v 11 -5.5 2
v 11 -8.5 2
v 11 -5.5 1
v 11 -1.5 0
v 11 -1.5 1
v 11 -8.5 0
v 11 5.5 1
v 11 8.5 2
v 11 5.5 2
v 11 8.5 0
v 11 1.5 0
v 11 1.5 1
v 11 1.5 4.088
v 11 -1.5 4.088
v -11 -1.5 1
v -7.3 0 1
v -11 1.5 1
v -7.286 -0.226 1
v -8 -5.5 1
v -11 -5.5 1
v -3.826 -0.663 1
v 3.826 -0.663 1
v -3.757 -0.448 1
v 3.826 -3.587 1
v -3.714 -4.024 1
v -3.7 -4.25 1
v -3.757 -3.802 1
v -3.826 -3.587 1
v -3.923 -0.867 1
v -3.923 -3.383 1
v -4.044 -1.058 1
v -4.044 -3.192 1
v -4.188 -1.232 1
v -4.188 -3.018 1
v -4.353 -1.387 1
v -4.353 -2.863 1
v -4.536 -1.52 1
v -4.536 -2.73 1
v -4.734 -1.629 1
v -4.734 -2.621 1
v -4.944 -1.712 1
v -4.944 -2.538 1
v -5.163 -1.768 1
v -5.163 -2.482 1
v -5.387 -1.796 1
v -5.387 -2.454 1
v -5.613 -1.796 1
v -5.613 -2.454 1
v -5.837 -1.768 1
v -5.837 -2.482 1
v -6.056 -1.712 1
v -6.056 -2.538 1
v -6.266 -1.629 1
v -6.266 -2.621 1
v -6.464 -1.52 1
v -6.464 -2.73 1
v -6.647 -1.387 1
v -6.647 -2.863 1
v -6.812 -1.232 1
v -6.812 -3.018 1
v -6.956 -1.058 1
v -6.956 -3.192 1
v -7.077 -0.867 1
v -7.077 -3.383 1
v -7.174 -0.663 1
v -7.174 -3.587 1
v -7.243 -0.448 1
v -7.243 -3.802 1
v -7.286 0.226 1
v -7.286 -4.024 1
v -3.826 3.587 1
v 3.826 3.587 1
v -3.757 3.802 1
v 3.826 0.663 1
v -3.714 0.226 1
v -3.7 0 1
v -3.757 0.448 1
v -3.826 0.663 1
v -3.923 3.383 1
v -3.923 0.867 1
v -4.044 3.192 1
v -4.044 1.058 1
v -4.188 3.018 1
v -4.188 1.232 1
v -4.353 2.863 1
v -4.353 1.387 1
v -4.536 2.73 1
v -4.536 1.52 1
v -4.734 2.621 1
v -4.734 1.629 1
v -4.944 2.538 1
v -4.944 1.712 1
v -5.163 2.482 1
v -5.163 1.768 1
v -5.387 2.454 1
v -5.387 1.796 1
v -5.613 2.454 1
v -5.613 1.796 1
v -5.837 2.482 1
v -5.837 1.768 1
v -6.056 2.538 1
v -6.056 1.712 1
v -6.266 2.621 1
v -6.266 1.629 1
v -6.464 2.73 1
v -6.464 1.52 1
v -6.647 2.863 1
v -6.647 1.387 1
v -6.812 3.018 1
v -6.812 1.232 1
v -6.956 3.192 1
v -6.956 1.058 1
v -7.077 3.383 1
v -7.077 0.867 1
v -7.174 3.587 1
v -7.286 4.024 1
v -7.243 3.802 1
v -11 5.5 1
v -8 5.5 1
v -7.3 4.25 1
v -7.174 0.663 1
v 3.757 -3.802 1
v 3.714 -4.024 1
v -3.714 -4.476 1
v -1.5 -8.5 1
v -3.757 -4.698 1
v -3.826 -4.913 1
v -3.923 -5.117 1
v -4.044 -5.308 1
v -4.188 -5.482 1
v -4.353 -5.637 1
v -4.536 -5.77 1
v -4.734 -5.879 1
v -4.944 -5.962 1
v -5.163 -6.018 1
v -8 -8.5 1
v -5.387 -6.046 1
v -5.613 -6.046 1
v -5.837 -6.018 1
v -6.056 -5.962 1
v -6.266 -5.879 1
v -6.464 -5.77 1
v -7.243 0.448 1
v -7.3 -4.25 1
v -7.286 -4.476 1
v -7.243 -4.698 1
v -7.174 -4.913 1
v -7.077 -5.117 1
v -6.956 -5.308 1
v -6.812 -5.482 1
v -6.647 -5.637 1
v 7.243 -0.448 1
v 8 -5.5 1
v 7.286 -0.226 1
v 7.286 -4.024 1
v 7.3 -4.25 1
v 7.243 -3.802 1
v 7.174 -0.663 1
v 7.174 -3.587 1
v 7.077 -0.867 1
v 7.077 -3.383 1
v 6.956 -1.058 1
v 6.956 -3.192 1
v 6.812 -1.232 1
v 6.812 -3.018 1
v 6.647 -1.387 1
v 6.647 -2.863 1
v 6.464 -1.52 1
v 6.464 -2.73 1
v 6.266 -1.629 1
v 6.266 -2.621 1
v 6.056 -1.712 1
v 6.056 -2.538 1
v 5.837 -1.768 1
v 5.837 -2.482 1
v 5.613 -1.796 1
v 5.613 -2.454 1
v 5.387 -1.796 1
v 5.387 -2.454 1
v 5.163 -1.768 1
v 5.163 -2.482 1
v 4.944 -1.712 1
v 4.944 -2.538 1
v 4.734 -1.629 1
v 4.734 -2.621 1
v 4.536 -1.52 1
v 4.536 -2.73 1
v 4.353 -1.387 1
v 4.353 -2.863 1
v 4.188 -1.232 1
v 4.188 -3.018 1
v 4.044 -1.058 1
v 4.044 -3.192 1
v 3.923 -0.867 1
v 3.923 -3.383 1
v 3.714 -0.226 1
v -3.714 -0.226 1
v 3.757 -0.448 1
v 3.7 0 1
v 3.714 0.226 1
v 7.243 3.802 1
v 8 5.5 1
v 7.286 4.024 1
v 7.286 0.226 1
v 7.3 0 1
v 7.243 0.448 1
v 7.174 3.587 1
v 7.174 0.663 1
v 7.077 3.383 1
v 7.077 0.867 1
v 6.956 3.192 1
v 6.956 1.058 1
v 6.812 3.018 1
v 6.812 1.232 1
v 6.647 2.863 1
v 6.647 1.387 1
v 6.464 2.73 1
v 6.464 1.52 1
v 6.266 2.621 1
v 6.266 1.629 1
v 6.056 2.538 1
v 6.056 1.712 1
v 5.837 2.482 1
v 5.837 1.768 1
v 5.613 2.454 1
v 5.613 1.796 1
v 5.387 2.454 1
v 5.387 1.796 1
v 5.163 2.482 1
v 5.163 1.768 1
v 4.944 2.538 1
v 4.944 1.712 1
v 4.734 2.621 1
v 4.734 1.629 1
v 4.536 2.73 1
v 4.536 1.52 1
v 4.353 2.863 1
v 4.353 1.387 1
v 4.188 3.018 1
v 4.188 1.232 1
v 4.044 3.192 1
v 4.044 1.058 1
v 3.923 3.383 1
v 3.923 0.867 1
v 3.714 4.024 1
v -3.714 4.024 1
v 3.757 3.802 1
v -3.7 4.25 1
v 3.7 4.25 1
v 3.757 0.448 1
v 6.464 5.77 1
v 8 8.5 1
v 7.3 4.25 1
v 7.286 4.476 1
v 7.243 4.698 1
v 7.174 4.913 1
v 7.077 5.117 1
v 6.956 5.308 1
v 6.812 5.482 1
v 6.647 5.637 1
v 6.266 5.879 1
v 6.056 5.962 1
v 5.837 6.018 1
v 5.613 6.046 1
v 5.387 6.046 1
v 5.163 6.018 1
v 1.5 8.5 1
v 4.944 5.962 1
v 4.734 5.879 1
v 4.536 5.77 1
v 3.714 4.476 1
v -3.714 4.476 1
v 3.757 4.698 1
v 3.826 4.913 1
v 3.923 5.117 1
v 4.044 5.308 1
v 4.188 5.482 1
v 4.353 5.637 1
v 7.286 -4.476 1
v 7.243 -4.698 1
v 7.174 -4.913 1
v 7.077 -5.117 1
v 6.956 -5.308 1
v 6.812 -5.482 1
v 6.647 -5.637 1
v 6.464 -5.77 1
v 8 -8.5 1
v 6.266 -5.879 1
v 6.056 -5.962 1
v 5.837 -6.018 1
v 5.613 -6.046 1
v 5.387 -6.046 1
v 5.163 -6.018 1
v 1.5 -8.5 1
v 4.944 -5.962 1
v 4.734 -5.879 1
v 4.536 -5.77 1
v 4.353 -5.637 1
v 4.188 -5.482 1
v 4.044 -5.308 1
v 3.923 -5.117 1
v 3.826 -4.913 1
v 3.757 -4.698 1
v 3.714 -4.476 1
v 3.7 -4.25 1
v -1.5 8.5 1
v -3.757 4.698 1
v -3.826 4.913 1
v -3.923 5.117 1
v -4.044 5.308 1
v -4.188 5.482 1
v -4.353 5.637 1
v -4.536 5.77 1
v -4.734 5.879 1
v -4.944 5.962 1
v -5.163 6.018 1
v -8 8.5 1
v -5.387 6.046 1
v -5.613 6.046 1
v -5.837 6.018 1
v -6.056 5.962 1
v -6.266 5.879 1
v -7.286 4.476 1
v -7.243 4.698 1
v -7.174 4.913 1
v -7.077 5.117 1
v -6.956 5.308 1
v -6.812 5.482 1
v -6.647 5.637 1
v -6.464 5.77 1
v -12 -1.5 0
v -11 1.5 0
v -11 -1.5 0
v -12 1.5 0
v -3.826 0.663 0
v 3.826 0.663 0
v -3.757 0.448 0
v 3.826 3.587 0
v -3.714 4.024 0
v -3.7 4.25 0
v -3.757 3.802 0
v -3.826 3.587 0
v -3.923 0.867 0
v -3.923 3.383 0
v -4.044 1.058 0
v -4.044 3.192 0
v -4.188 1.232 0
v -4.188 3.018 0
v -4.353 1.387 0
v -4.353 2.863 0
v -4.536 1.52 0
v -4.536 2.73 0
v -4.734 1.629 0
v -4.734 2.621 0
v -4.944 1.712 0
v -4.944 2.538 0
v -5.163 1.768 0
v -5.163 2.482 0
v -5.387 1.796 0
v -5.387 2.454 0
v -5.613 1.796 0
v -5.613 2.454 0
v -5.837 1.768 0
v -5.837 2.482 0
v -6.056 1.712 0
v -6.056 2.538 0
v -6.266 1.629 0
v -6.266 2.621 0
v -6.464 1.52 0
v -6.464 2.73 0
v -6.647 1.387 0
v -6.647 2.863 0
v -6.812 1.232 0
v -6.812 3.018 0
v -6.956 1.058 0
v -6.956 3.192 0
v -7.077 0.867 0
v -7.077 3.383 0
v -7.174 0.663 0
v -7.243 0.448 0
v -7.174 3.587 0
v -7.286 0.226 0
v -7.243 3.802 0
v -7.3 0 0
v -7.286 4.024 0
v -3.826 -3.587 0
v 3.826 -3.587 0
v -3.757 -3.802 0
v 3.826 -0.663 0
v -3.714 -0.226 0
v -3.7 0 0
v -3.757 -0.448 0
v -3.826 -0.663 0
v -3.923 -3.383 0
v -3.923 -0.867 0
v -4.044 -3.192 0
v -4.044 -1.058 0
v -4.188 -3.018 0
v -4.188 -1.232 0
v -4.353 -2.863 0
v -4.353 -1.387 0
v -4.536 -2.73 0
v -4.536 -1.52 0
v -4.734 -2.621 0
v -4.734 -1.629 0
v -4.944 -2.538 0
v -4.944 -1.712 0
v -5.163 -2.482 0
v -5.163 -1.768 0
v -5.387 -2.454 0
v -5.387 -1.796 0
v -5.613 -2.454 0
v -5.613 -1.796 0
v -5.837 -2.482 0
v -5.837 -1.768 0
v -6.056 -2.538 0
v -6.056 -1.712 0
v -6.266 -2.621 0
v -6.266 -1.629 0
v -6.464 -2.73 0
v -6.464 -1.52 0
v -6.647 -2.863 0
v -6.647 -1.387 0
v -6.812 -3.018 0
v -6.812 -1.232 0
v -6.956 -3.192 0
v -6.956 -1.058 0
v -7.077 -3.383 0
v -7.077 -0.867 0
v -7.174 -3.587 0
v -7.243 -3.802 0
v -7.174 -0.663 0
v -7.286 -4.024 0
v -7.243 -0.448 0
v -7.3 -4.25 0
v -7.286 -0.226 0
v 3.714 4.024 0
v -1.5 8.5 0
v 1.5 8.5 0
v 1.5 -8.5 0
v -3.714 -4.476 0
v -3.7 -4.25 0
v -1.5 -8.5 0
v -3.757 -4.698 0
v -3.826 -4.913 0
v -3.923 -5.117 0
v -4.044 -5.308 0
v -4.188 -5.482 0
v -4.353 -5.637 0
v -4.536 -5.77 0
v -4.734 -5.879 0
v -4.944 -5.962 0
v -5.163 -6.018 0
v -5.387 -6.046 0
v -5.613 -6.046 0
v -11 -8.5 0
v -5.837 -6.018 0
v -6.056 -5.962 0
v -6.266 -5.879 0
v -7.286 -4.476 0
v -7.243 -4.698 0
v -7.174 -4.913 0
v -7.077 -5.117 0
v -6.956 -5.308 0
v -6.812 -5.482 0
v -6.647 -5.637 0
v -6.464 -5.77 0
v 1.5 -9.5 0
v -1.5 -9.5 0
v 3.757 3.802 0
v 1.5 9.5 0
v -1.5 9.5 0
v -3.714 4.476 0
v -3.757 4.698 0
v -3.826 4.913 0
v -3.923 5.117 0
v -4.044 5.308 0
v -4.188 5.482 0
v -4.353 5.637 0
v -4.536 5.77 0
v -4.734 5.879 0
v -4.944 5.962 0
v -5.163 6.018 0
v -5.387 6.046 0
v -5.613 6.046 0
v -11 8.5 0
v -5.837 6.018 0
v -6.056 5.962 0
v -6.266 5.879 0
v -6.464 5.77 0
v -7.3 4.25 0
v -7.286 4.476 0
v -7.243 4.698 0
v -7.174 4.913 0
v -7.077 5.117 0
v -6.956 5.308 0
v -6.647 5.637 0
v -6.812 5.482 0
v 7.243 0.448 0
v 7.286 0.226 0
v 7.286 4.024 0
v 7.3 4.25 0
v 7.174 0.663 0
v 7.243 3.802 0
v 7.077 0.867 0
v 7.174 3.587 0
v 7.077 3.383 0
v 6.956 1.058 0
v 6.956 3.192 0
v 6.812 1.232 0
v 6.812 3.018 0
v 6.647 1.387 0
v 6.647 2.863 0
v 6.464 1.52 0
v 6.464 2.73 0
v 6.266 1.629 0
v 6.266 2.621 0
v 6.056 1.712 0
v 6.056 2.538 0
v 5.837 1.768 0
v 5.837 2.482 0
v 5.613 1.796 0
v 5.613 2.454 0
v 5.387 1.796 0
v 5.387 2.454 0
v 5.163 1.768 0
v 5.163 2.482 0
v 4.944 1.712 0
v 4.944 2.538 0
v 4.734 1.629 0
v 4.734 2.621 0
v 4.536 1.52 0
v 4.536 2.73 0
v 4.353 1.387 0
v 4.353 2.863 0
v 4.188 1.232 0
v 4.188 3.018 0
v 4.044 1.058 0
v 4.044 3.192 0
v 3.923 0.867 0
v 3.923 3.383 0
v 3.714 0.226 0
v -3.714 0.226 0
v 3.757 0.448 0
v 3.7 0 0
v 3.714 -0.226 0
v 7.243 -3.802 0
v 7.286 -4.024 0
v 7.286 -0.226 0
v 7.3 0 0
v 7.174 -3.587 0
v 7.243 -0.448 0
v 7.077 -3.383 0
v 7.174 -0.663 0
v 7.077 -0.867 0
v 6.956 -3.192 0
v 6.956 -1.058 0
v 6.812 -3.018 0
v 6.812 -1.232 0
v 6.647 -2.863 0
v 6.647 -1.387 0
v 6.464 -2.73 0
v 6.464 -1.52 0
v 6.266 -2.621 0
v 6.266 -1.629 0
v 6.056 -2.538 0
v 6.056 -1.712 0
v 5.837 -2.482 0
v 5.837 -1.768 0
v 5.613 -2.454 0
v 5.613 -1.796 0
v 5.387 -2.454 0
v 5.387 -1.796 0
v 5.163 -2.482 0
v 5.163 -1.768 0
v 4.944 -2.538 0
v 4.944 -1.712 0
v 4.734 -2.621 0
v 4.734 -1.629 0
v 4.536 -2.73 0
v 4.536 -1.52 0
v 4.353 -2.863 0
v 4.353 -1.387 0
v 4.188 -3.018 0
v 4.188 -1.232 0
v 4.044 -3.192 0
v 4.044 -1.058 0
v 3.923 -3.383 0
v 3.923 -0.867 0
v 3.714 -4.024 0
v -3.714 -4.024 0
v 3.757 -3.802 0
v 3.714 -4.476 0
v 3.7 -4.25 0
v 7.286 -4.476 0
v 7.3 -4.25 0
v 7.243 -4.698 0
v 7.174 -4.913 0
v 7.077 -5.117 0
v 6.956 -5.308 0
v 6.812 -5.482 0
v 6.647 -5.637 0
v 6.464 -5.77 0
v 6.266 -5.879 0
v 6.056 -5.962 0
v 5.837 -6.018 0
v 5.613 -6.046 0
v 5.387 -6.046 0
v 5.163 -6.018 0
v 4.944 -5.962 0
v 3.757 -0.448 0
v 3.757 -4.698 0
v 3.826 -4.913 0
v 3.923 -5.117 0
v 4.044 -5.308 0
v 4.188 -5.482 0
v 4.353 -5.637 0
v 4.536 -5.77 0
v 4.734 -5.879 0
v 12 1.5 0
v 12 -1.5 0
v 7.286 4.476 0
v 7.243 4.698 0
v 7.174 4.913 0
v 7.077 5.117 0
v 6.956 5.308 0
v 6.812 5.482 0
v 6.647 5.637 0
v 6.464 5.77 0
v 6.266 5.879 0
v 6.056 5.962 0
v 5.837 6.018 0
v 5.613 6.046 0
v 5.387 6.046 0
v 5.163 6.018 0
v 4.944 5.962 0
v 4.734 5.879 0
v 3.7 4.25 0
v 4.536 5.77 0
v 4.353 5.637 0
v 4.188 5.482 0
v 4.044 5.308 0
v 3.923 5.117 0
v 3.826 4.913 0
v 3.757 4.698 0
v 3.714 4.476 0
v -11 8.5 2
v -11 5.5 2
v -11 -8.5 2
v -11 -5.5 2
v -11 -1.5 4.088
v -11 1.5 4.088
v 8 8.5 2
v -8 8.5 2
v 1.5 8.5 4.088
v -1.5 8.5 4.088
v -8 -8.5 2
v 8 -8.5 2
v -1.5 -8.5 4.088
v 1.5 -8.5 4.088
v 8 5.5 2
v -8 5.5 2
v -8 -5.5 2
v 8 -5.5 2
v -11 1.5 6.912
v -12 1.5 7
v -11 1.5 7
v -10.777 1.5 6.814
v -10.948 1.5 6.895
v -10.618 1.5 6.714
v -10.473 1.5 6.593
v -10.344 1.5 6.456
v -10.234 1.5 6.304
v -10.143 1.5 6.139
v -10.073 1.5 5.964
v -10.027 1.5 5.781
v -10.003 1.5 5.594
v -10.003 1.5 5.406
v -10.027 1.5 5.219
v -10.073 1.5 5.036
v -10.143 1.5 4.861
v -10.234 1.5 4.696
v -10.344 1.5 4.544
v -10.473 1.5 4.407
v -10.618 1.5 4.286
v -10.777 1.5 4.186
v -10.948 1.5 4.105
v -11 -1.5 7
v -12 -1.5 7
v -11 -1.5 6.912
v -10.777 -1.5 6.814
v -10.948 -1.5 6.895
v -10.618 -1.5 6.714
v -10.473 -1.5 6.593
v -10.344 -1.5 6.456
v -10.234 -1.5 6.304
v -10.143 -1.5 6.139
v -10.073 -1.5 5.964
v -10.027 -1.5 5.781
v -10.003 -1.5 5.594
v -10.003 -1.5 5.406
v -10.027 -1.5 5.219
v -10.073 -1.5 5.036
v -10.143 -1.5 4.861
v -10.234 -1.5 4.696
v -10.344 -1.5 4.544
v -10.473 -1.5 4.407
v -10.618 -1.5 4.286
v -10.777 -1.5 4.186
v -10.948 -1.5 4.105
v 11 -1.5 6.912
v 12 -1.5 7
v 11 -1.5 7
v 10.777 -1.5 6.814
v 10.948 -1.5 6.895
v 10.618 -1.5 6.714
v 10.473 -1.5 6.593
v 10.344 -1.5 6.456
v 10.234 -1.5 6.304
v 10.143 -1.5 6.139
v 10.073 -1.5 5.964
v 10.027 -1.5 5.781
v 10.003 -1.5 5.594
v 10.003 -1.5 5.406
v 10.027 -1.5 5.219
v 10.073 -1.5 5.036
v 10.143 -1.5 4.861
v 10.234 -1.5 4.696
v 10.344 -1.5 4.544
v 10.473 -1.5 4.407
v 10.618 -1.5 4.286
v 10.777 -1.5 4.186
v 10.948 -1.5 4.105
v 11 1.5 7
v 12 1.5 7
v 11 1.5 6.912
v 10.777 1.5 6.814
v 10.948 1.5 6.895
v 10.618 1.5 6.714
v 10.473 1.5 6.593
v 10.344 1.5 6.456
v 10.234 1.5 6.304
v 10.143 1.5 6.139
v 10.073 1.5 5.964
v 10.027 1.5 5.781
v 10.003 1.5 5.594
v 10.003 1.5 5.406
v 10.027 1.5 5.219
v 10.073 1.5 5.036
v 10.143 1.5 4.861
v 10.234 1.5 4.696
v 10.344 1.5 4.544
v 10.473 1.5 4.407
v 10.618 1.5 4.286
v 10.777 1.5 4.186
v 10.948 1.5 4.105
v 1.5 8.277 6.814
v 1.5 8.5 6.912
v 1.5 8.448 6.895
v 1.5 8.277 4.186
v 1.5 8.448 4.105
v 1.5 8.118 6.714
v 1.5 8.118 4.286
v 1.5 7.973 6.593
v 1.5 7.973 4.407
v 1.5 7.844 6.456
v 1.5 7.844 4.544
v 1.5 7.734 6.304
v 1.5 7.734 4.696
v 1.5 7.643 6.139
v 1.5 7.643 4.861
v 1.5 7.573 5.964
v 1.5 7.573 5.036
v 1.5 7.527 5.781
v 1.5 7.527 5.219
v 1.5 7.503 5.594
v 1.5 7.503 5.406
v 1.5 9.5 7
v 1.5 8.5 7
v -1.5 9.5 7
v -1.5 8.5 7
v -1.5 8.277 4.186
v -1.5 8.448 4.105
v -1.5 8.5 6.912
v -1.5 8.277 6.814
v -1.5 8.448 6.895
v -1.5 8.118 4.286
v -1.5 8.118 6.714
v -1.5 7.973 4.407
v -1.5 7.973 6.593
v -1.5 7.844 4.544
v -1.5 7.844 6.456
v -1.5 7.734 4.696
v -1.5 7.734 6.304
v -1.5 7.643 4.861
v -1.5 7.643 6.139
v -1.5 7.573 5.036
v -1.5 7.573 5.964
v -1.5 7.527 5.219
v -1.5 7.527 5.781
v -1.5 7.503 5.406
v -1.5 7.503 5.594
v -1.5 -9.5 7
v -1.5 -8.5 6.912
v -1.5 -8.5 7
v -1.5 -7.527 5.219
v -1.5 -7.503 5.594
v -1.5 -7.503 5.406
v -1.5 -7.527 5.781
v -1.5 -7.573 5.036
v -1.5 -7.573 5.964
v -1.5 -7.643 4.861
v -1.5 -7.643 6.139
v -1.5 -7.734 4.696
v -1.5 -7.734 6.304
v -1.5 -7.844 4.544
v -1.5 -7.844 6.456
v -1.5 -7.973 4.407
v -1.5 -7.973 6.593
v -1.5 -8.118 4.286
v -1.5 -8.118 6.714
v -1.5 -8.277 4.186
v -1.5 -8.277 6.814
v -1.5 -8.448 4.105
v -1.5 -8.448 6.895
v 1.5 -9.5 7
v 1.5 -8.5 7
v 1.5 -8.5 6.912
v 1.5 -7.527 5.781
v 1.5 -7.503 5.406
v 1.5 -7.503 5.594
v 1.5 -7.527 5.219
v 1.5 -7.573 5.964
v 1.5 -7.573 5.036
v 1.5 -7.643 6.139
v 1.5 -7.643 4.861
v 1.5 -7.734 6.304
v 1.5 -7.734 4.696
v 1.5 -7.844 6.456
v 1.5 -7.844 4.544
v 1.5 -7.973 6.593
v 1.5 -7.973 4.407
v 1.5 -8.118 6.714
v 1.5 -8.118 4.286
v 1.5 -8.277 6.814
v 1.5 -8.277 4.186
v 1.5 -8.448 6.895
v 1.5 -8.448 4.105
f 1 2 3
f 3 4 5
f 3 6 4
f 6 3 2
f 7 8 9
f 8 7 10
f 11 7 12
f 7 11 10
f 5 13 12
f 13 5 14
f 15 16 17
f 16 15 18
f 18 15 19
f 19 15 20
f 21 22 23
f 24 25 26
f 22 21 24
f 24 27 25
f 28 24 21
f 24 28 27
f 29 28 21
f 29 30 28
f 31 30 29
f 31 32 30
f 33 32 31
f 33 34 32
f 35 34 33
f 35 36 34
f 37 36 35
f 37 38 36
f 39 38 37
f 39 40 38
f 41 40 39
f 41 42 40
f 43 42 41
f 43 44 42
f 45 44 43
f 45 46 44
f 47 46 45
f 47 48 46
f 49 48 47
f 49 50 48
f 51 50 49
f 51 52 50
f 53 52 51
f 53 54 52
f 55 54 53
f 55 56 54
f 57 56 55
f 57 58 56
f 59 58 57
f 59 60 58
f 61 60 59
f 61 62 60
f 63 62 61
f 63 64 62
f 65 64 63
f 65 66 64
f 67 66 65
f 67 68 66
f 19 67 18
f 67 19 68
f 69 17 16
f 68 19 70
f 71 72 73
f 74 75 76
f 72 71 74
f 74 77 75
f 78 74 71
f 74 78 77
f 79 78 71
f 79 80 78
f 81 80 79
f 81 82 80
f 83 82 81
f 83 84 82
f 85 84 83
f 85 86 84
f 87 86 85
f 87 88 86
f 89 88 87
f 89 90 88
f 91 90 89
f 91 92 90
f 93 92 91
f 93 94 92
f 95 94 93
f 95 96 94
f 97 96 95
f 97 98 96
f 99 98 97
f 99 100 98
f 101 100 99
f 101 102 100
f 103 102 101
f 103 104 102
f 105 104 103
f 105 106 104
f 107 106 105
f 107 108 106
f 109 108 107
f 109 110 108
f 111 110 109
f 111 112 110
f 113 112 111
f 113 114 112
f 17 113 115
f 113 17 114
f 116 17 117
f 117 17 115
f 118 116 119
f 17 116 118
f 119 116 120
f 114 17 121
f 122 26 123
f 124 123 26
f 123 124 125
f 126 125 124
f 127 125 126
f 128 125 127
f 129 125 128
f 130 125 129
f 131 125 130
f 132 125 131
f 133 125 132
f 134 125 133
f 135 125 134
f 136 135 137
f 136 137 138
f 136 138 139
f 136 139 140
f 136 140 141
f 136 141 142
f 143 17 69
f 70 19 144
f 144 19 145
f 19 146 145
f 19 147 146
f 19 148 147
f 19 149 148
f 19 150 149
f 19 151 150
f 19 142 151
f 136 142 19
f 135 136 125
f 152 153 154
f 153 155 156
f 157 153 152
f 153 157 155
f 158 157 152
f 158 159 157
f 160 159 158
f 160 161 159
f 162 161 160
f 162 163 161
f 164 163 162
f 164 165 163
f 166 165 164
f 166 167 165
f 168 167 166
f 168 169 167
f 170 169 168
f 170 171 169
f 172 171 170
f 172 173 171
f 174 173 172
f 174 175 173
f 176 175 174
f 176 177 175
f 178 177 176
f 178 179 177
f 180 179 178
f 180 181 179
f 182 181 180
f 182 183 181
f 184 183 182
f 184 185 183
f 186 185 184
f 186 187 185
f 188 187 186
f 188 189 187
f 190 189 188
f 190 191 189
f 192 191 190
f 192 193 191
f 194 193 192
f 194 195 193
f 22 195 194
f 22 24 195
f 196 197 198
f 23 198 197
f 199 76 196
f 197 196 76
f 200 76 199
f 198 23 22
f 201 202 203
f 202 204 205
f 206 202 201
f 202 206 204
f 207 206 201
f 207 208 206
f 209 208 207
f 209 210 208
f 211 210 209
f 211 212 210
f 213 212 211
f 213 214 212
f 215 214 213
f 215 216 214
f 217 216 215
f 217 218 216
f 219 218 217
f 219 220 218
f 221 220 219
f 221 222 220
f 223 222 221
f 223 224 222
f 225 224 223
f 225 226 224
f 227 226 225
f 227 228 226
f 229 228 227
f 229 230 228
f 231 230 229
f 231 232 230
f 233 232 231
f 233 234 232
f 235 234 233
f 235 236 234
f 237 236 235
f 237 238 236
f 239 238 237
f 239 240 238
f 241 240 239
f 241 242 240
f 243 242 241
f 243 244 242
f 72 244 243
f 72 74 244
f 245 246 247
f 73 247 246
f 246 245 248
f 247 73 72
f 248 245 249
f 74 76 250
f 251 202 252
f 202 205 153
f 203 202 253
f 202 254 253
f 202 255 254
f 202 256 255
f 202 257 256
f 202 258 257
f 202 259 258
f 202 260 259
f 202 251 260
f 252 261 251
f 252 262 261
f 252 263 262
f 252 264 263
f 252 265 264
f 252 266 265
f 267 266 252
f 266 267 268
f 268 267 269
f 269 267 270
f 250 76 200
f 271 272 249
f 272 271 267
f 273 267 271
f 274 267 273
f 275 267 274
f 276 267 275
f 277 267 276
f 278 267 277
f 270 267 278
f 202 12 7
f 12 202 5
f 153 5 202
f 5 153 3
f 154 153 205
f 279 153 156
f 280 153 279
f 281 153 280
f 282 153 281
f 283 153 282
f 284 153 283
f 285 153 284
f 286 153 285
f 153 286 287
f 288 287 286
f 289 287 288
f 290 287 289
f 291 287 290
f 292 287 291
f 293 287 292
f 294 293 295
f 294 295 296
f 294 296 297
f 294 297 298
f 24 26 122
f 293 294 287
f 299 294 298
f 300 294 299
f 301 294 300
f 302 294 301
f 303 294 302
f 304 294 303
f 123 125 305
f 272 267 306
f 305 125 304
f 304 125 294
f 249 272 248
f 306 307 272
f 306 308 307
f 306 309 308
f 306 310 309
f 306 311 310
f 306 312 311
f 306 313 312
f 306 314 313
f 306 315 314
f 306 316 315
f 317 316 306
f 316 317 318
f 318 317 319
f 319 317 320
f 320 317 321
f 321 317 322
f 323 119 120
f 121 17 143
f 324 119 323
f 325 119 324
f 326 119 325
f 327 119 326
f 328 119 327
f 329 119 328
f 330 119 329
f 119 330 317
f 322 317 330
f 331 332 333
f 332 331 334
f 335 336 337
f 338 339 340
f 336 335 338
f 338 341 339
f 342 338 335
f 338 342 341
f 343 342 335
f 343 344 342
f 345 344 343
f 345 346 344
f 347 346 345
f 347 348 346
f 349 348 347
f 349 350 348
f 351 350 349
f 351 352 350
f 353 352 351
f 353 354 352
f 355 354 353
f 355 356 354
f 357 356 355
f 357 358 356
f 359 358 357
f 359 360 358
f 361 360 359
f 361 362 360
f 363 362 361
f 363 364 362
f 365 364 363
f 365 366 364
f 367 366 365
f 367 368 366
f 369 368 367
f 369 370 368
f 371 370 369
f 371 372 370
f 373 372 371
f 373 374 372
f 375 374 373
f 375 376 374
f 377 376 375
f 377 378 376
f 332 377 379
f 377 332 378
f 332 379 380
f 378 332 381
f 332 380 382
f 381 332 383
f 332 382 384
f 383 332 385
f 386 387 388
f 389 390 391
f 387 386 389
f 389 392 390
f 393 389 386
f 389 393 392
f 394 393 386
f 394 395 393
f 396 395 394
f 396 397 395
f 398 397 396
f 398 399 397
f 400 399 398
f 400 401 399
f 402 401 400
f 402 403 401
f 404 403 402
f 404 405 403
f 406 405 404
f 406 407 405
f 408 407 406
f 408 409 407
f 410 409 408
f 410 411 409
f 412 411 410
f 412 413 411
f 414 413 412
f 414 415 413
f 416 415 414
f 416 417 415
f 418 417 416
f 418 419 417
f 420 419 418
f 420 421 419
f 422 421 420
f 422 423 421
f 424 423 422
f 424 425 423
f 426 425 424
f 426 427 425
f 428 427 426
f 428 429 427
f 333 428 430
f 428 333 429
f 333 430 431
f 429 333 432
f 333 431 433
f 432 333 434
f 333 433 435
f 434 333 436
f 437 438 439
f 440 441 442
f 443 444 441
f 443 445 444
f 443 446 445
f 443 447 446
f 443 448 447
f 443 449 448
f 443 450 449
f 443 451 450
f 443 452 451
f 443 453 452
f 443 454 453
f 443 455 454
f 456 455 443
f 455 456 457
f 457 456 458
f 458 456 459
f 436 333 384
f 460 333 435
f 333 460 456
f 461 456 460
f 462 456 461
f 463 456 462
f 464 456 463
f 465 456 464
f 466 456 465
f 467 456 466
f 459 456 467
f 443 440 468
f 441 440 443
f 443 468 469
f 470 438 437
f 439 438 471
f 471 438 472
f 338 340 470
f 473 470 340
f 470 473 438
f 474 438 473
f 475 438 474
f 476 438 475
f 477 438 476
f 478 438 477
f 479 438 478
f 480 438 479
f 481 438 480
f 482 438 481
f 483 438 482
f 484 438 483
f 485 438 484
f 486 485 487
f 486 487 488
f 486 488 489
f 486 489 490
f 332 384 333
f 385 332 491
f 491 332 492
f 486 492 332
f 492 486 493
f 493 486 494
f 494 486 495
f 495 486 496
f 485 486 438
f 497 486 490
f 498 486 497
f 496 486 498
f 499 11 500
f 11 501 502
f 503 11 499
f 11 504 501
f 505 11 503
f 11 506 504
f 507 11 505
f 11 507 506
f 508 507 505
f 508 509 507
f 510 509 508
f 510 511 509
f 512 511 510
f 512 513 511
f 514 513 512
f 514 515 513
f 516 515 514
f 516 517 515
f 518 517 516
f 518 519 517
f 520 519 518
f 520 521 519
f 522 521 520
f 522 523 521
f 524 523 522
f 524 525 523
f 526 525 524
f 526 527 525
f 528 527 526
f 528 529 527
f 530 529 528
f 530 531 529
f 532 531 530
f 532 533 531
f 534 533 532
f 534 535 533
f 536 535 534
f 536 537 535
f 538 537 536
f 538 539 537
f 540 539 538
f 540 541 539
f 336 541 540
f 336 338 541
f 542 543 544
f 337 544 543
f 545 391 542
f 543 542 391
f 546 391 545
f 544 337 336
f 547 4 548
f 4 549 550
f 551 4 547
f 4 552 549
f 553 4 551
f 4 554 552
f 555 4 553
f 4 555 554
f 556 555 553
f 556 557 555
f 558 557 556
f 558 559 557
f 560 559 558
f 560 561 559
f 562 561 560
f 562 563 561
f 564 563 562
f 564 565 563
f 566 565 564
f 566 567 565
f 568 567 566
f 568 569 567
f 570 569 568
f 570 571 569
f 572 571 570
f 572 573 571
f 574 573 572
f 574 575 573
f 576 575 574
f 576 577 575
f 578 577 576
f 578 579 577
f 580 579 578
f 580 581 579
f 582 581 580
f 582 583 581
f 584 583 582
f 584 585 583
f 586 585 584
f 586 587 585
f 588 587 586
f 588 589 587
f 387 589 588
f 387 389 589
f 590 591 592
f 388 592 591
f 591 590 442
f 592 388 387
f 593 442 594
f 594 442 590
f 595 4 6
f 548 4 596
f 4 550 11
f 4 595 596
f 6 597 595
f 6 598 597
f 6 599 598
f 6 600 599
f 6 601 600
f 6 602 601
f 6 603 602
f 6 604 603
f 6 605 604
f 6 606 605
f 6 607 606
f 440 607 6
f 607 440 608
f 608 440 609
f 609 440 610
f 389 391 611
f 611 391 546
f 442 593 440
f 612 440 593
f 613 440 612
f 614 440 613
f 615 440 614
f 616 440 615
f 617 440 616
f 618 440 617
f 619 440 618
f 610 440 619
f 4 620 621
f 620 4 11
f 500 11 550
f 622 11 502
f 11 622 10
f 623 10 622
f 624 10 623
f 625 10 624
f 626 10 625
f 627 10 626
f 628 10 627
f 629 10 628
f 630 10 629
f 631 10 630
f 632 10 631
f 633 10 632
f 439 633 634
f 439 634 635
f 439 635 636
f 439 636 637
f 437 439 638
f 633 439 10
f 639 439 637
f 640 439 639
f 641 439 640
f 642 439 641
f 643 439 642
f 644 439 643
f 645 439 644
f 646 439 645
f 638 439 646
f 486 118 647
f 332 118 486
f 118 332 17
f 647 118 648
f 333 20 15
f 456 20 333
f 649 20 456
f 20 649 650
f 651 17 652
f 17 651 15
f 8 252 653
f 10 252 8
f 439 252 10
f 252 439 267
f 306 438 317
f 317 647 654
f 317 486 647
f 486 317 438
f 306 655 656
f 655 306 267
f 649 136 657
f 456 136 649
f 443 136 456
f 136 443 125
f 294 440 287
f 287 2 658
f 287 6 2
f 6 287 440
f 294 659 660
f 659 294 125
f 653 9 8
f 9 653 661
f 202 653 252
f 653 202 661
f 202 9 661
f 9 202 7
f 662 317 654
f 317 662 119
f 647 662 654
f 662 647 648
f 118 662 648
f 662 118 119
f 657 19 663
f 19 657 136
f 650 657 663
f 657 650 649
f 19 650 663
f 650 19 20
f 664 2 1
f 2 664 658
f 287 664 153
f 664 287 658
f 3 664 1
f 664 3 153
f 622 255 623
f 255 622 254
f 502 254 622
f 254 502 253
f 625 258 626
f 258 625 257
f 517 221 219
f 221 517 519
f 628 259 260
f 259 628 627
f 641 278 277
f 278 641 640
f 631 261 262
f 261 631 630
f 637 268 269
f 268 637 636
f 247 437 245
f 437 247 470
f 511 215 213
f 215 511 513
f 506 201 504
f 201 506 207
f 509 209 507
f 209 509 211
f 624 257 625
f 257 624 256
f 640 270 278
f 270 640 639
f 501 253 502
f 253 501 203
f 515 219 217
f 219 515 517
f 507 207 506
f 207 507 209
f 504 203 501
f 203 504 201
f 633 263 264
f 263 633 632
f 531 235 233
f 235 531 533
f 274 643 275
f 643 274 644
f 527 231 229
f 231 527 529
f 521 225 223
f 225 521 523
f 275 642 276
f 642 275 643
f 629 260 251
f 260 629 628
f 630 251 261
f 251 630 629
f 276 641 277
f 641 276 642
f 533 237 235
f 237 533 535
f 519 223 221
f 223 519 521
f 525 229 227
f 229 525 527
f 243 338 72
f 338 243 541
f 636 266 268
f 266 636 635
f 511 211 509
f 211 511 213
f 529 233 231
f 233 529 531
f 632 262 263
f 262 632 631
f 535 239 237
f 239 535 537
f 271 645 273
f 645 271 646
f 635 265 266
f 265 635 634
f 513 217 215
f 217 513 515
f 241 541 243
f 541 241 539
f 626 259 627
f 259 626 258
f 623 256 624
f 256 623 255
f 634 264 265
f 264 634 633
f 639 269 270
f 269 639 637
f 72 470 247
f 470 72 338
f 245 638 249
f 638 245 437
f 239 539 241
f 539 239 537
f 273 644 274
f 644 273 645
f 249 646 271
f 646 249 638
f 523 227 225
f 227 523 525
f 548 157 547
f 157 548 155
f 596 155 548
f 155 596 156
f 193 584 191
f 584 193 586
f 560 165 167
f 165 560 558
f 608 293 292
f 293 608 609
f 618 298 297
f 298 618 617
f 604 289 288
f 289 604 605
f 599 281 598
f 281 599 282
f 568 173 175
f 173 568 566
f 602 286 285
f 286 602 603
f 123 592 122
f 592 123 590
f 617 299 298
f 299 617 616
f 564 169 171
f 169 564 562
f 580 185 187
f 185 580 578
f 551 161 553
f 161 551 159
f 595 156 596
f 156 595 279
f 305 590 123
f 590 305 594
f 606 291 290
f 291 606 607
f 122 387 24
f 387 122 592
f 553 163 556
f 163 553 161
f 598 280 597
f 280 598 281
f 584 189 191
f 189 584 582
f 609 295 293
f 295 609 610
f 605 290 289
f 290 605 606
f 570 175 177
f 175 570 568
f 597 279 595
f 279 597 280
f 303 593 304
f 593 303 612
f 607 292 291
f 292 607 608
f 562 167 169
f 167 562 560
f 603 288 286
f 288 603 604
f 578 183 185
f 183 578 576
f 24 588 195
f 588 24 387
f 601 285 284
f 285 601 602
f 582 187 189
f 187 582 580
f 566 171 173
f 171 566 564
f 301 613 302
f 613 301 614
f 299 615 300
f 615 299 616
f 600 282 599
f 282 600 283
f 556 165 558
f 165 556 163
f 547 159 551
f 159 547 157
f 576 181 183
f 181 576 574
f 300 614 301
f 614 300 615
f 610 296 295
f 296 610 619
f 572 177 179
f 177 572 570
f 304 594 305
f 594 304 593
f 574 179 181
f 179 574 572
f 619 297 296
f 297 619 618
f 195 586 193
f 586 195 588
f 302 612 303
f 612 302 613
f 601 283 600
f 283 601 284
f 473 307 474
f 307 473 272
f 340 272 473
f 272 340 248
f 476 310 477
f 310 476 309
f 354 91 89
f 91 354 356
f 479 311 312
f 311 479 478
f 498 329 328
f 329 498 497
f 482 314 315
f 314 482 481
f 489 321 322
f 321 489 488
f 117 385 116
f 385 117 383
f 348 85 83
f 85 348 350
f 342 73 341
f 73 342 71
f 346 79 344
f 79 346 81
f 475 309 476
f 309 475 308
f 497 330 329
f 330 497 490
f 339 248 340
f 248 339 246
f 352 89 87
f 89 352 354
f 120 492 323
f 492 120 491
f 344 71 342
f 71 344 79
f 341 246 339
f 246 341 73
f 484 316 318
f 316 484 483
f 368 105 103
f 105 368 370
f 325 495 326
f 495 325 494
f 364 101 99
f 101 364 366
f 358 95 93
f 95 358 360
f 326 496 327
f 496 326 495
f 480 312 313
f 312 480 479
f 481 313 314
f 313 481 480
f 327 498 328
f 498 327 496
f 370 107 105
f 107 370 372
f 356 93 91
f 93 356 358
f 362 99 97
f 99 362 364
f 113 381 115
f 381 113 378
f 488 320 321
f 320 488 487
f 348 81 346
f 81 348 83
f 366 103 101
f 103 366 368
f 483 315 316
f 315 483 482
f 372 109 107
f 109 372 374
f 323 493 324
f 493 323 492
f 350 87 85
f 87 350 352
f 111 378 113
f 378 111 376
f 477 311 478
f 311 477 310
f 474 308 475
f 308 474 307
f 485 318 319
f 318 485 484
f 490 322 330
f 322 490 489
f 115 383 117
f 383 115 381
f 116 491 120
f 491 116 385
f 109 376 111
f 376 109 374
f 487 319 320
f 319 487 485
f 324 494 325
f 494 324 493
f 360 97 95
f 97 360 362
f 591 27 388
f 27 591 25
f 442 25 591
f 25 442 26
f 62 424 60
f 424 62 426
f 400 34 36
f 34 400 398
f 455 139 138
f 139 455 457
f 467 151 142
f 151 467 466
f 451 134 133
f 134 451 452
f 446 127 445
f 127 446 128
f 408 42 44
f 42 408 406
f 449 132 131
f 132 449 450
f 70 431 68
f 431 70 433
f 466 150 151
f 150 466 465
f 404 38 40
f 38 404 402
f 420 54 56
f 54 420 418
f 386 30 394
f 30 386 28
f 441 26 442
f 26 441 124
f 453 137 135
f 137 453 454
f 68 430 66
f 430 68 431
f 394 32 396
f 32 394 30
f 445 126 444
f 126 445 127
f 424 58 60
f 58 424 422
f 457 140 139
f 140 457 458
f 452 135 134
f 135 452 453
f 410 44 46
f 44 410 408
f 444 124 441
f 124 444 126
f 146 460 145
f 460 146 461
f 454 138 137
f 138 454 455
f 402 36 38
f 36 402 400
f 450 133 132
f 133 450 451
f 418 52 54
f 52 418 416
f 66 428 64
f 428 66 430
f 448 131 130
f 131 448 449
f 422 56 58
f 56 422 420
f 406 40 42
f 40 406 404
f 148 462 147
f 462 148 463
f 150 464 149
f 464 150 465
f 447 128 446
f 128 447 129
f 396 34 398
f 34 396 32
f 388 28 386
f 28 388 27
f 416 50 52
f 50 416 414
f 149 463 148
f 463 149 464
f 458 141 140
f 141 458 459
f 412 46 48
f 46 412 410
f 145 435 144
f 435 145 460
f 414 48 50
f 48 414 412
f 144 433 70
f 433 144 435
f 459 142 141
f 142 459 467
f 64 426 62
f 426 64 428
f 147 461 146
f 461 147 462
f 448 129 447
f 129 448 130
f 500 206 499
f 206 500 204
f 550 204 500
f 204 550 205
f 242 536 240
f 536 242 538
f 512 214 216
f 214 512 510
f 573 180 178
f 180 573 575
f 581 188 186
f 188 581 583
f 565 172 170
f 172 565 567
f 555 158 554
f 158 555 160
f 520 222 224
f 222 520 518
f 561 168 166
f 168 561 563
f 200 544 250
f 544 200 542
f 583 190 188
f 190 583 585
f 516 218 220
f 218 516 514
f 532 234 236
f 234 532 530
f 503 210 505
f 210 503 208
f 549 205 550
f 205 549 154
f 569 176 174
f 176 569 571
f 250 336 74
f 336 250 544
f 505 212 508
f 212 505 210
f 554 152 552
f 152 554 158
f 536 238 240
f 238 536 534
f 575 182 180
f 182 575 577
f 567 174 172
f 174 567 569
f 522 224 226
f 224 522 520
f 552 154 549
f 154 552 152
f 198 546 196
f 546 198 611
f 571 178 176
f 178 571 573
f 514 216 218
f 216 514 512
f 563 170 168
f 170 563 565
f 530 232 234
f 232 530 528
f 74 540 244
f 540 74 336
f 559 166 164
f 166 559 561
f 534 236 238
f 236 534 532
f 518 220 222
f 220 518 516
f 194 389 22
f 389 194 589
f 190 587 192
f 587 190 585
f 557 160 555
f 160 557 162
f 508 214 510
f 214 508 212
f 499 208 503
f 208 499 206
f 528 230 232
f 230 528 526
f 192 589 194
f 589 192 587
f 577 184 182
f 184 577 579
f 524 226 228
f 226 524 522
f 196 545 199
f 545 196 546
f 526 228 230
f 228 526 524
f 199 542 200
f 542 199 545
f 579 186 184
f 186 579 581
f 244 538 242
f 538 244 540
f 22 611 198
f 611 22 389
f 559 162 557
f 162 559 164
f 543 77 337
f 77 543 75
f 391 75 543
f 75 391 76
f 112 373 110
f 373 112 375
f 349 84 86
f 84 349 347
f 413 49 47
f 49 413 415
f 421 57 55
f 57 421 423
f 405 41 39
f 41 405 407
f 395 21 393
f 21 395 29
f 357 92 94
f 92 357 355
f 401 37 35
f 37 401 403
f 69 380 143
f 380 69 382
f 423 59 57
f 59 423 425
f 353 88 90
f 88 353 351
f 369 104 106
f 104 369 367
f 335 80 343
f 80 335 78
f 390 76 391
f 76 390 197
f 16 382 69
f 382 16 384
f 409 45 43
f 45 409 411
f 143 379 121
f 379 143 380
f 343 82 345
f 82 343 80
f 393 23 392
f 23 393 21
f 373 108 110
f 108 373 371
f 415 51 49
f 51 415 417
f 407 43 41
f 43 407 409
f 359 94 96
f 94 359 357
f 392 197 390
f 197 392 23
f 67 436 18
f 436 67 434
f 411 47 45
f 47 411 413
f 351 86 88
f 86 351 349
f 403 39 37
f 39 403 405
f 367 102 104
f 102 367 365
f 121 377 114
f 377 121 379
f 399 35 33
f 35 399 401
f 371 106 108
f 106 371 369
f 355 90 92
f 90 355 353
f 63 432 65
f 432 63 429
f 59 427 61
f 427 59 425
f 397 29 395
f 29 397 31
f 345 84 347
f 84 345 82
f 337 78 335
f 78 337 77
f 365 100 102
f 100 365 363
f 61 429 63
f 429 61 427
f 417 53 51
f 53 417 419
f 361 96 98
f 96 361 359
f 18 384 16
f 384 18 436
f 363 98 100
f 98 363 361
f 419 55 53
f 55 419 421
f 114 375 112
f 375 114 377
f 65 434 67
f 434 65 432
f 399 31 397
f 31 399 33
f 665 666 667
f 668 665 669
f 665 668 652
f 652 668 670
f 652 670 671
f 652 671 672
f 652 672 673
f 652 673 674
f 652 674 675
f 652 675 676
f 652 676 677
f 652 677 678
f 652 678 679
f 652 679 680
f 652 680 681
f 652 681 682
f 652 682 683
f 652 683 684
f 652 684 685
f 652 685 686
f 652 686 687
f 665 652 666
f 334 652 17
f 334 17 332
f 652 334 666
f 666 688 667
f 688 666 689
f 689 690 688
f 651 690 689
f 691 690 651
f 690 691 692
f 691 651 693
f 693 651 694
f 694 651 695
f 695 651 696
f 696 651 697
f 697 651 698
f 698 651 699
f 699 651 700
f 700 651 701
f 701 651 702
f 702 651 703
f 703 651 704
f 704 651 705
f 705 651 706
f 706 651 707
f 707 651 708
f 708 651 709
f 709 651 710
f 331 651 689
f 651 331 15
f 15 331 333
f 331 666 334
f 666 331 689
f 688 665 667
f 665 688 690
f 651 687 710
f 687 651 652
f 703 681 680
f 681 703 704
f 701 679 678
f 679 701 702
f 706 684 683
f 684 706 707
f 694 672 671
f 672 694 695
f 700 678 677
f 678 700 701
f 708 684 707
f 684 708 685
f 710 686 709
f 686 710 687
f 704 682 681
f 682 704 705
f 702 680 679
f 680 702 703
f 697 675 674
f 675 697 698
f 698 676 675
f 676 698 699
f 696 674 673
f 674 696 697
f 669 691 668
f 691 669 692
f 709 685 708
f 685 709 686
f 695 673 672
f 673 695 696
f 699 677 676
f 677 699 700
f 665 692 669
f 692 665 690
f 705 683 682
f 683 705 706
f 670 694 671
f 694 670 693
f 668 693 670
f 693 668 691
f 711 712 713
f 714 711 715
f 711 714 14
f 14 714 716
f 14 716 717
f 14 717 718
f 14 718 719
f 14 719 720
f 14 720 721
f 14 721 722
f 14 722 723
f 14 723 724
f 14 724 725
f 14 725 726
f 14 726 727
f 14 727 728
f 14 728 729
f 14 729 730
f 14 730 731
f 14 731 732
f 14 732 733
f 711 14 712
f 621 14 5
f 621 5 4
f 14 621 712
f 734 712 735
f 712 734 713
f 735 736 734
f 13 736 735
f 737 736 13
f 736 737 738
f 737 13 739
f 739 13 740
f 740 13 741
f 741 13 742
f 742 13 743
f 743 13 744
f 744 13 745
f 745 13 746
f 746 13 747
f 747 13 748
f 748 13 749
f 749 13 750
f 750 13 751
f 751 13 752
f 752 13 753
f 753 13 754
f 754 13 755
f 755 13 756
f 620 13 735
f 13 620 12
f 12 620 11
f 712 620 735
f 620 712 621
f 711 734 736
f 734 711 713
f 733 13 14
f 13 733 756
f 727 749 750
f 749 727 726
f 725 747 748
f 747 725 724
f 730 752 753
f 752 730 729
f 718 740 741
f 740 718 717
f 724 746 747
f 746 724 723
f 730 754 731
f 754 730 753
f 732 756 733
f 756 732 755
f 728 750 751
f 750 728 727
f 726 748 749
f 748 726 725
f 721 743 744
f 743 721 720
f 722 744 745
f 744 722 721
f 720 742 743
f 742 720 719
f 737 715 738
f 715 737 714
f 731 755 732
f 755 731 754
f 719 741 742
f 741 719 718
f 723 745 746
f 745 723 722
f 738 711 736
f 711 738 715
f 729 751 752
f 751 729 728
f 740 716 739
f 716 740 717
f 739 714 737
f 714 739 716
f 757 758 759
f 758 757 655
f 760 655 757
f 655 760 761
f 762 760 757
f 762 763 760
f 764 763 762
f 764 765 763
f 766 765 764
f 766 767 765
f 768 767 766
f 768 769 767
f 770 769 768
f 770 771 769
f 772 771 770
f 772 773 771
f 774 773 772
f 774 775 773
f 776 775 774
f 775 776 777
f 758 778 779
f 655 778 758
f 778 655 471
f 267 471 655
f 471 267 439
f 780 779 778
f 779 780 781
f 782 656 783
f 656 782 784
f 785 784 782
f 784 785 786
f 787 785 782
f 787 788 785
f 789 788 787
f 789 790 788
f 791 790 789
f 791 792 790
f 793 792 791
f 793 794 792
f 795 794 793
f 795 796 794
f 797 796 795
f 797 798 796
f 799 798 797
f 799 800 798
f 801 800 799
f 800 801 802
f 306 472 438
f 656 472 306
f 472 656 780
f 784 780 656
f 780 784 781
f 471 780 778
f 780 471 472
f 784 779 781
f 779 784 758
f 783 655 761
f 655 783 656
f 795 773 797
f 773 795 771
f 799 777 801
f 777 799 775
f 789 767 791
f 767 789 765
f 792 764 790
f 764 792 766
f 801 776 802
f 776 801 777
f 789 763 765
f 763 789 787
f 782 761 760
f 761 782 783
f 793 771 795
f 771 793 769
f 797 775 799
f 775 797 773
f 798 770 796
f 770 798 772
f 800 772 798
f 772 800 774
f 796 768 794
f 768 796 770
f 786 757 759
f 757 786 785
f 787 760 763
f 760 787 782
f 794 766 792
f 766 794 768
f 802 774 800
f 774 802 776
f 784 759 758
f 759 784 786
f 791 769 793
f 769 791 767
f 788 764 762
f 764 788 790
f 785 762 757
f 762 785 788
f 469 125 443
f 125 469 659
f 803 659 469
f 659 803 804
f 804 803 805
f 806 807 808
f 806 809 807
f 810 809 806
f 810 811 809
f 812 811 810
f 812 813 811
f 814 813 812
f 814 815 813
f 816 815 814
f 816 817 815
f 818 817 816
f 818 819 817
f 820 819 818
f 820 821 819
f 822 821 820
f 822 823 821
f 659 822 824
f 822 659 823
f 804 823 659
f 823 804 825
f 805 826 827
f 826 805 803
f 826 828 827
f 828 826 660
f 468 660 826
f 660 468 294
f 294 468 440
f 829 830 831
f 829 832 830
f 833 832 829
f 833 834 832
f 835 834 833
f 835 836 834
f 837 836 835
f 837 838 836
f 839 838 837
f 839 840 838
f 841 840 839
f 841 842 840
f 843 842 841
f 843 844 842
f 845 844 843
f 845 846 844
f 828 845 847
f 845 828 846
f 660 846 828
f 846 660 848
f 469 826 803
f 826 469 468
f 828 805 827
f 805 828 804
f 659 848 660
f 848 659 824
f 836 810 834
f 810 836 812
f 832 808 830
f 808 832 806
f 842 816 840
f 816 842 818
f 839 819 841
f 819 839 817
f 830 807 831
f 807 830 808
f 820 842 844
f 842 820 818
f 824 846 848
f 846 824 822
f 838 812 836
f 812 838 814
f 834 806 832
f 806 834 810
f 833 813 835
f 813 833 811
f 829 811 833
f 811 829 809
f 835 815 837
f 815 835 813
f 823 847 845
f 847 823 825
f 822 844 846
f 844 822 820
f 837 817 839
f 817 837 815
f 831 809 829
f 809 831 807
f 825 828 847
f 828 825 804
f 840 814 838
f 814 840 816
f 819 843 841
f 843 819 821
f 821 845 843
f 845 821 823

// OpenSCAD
$fn = 50;
BASE_W = 22;
BASE_D = 17;
BASE_H = 1;
PIN_W = 3;
PIN_D = 1;
PIN_H = 7;
LOCK_R = 1.5;
LOCK_Z = PIN_H - LOCK_R;
STAND_W = 3;
STAND_D = 3;
STAND_H = 1;

module pin_lock() {
  difference() {
    union() {
      translate([0, 0, PIN_H/2]) {
        cube([PIN_W, PIN_D, PIN_H], center=true);
      }
      translate([0, 0, LOCK_Z]) {
        rotate([0, 90, 0]) {
          cylinder(r=LOCK_R, h=PIN_W, center=true);
        }
      }
    }
    translate([0, PIN_D, PIN_H/2]) {
      cube([PIN_W, PIN_D, PIN_H], center=true);
    }
  }
}

module hole3m() {
  cylinder(r=1.8, h=10, center=true);
}

module stand() {
  cube([STAND_W, STAND_D, STAND_H], center=false);
}

difference() {
  translate([0, 0, 0.5]) {
    union() {
      cube([BASE_W, BASE_D, BASE_H], center=true);
      translate([BASE_W/2-STAND_W, BASE_D/2-STAND_D, 0.5]) {
        stand();
      }
      translate([-BASE_W/2, BASE_D/2-STAND_D, 0.5]) {
        stand();
      }
      translate([-BASE_W/2, -BASE_D/2, 0.5]) {
        stand();
      }
      translate([BASE_W/2-STAND_W, -BASE_D/2, 0.5]) {
        stand();
      }
    }
  }
  translate([BASE_W/4, BASE_D/4, 0]) {
    hole3m();
  }
  translate([BASE_W/4, -BASE_D/4, 0]) {
    hole3m();
  }
  translate([-BASE_W/4, BASE_D/4, 0]) {
    hole3m();
  }
  translate([-BASE_W/4, -BASE_D/4, 0]) {
    hole3m();
  }
  translate([BASE_W/4, 0, 0]) {
    hole3m();
  }
  translate([-BASE_W/4, 0, 0]) {
    hole3m();
  }
}

translate([-(BASE_W/2+0.5), 0, 0]) {
  rotate([0, 0, 90]) {
    pin_lock();
  }
}

translate([(BASE_W/2+0.5), 0, 0]) {
  rotate([0, 0, 270]) {
    pin_lock();
  }
}

translate([0, (BASE_D/2+0.5), 0]) {
  rotate([0, 0, 0]) {
    pin_lock();
  }
}

translate([0, -(BASE_D/2+0.5), 0]) {
  rotate([0, 0, 180]) {
    pin_lock();
  }
}
